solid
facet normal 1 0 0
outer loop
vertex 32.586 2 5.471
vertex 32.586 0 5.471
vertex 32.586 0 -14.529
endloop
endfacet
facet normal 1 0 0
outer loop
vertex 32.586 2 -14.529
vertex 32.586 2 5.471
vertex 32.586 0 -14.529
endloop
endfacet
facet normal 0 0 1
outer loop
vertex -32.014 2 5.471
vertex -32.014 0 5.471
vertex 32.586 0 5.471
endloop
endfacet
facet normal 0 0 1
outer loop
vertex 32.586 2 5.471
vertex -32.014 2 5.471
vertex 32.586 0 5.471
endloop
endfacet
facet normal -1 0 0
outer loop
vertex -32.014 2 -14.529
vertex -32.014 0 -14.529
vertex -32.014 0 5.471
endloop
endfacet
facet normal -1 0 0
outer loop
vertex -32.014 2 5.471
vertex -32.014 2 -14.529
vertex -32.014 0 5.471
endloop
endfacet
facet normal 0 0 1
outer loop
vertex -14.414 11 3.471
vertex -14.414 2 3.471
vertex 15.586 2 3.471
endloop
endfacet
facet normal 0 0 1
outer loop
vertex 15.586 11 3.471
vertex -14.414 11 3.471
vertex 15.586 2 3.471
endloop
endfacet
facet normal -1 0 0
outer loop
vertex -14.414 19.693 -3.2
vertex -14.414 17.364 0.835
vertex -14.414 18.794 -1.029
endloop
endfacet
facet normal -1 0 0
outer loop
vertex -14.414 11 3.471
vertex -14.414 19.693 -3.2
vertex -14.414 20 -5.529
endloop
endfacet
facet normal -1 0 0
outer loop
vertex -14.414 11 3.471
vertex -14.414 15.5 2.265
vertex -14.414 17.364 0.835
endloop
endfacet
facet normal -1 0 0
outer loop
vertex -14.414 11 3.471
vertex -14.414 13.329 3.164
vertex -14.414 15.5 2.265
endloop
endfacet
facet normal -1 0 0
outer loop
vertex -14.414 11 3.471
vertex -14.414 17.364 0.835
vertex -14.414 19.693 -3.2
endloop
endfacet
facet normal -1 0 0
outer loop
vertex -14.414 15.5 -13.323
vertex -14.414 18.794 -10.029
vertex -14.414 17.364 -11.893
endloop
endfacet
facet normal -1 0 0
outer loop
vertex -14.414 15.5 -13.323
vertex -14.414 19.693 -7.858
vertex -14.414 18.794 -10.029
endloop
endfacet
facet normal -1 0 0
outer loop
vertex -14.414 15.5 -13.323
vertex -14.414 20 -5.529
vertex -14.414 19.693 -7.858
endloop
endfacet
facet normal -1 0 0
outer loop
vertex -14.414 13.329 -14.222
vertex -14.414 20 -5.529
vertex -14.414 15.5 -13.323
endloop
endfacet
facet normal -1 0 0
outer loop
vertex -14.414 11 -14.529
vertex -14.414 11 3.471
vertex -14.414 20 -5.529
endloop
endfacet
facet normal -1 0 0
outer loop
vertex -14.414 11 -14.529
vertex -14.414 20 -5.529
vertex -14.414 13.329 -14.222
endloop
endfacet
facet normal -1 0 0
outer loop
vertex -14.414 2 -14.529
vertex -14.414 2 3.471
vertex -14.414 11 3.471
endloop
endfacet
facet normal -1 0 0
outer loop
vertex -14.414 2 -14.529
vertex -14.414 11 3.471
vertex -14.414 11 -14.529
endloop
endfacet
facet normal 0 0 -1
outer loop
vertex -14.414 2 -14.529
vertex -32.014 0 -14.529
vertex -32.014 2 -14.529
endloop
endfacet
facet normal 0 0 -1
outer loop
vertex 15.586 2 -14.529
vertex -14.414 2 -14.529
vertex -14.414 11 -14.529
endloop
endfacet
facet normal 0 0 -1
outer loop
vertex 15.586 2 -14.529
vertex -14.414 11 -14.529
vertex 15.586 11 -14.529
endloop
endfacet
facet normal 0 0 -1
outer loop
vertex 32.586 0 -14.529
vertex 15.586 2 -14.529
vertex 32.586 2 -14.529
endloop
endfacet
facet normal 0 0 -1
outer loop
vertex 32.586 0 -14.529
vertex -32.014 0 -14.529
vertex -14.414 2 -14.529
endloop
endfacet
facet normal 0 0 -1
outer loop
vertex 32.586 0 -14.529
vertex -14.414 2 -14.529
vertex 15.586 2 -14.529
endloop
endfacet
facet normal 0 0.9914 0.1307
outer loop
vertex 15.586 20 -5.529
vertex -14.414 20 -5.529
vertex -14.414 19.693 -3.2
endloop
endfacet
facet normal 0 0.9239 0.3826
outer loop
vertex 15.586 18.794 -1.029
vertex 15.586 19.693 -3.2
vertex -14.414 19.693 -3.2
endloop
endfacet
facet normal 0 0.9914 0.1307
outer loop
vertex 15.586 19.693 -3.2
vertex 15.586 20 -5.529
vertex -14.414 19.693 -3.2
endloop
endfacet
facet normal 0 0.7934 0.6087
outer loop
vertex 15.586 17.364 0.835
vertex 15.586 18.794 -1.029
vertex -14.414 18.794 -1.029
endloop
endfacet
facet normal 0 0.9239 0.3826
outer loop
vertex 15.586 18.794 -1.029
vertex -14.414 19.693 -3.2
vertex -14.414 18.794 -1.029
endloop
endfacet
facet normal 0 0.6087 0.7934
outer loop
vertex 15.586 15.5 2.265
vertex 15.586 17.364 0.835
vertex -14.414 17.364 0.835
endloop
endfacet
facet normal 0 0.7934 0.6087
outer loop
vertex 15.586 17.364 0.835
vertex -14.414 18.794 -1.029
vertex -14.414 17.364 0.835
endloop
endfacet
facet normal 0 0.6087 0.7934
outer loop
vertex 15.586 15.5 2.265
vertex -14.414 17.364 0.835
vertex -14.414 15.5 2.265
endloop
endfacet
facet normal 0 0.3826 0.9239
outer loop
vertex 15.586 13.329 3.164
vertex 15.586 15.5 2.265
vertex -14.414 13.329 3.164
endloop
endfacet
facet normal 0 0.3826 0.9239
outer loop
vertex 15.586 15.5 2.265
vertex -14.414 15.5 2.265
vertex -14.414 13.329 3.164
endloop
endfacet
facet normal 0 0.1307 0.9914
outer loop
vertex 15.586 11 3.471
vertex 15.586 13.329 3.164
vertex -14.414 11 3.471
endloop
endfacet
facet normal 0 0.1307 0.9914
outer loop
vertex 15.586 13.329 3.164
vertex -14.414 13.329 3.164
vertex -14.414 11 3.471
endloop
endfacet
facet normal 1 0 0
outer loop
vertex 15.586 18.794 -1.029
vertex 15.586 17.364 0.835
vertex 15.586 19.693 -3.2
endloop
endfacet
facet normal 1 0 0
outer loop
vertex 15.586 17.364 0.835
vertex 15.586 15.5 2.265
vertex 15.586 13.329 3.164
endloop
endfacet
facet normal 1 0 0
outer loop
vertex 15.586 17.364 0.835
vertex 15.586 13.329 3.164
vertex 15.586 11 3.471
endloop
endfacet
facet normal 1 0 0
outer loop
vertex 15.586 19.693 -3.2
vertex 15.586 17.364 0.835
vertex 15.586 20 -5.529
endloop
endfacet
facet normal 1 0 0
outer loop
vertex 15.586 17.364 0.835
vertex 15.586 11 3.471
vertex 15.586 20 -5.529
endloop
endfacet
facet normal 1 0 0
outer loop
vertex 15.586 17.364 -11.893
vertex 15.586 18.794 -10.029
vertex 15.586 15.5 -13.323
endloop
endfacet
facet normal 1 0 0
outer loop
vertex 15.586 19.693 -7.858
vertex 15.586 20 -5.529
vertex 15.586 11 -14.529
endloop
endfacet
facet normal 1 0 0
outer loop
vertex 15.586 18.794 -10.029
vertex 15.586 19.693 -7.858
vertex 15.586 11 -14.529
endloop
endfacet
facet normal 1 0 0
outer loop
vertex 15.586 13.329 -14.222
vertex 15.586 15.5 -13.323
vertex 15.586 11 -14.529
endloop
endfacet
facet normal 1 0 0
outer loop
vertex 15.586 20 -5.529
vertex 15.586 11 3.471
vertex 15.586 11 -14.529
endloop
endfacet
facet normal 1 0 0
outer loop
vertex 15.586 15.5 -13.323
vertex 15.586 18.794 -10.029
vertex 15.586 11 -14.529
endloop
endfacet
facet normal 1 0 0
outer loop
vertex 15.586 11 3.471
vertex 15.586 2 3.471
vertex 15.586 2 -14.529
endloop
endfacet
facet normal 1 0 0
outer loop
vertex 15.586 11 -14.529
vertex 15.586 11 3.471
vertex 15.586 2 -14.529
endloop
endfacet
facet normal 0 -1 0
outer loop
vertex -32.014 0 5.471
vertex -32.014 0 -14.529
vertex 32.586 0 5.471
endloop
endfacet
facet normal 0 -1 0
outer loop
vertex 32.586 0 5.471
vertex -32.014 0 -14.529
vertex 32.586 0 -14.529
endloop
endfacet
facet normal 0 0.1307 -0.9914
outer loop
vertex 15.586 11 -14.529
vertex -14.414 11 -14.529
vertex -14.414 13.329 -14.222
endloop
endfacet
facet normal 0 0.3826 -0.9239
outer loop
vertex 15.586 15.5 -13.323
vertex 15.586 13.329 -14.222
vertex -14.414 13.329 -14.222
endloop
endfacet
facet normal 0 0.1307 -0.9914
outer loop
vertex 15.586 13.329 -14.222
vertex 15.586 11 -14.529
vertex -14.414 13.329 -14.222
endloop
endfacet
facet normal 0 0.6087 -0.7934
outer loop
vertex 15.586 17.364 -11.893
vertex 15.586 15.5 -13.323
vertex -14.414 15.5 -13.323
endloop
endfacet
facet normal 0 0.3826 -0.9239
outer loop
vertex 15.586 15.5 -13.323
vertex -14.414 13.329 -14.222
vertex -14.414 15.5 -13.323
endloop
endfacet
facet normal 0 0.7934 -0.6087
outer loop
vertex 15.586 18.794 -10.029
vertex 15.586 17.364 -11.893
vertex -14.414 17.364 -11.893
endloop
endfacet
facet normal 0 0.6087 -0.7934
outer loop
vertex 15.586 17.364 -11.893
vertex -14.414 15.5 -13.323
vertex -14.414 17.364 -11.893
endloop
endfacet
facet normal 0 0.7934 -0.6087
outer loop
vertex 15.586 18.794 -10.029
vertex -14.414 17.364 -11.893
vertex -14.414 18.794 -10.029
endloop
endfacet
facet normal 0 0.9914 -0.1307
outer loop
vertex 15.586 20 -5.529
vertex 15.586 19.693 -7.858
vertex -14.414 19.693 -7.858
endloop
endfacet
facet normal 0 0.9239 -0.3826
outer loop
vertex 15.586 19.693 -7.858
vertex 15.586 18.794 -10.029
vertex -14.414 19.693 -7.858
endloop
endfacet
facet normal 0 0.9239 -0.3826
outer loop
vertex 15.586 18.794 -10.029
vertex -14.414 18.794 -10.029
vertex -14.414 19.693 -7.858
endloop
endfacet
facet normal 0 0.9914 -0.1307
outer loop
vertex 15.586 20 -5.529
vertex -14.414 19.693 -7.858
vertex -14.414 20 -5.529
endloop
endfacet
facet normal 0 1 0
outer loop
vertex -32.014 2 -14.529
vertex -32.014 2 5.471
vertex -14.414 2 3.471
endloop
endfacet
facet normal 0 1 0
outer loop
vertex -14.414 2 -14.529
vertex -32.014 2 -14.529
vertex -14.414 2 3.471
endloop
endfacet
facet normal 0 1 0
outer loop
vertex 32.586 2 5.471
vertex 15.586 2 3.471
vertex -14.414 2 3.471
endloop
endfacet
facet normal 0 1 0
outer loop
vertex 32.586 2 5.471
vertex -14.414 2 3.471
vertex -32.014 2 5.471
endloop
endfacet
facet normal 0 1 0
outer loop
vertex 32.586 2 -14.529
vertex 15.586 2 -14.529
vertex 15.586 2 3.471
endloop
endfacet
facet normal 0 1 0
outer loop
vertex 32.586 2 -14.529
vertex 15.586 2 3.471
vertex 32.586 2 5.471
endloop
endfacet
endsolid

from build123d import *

# Parameters (mm, degrees)
BOSS_EXTRUDE1_DEPTH = 2
SKETCH1_3_W         = 30
SKETCH1_3_H         = 18
BOSS_EXTRUDE2_DEPTH = 20
CUT_EXTRUDE1_DEPTH  = 54.104524665


with BuildPart() as part:
    # Sketch1 → Boss-Extrude1 (new body)
    with BuildSketch(Plane(origin=(0, 0, 0), x_dir=(1, 0, 0), z_dir=(0, 1, 0))):
        Polygon((-14.414477612, 14.528955224), (-32.014477612, 14.528955224), (-32.014477612, -5.471044776), (32.585522388, -5.471044776), (32.585522388, 14.528955224), (15.585522388, 14.528955224), (15.585522388, -3.471044776), (-14.414477612, -3.471044776), align=None)
    extrude(amount=BOSS_EXTRUDE1_DEPTH)

    # Sketch1<3> → Boss-Extrude2 (add)
    with BuildSketch(Plane(origin=(0, 0, 0), x_dir=(1, 0, 0), z_dir=(0, 1, 0))):
        with Locations((0.585522388, 5.528955224)):
            Rectangle(SKETCH1_3_W, SKETCH1_3_H)
    extrude(amount=BOSS_EXTRUDE2_DEPTH)

    # Sketch2 → Cut-Extrude1 (cut, through all)
    with BuildSketch(Plane.ZY.offset(14.414477612)):
        with BuildLine():
            Line((-14.528955224, 20), (-14.528955224, 11))
            ThreePointArc((-14.528955224, 11), (-11.892916255, 17.363961031), (-5.528955224, 20))
            Line((-5.528955224, 20), (-14.528955224, 20))
        make_face()
        with BuildLine():
            ThreePointArc((-5.528955224, 20), (0.835005807, 17.363961031), (3.471044776, 11))
            Line((3.471044776, 11), (3.471044776, 20))
            Line((3.471044776, 20), (-5.528955224, 20))
        make_face()
    extrude(amount=-CUT_EXTRUDE1_DEPTH, mode=Mode.SUBTRACT)


solid = part.part
